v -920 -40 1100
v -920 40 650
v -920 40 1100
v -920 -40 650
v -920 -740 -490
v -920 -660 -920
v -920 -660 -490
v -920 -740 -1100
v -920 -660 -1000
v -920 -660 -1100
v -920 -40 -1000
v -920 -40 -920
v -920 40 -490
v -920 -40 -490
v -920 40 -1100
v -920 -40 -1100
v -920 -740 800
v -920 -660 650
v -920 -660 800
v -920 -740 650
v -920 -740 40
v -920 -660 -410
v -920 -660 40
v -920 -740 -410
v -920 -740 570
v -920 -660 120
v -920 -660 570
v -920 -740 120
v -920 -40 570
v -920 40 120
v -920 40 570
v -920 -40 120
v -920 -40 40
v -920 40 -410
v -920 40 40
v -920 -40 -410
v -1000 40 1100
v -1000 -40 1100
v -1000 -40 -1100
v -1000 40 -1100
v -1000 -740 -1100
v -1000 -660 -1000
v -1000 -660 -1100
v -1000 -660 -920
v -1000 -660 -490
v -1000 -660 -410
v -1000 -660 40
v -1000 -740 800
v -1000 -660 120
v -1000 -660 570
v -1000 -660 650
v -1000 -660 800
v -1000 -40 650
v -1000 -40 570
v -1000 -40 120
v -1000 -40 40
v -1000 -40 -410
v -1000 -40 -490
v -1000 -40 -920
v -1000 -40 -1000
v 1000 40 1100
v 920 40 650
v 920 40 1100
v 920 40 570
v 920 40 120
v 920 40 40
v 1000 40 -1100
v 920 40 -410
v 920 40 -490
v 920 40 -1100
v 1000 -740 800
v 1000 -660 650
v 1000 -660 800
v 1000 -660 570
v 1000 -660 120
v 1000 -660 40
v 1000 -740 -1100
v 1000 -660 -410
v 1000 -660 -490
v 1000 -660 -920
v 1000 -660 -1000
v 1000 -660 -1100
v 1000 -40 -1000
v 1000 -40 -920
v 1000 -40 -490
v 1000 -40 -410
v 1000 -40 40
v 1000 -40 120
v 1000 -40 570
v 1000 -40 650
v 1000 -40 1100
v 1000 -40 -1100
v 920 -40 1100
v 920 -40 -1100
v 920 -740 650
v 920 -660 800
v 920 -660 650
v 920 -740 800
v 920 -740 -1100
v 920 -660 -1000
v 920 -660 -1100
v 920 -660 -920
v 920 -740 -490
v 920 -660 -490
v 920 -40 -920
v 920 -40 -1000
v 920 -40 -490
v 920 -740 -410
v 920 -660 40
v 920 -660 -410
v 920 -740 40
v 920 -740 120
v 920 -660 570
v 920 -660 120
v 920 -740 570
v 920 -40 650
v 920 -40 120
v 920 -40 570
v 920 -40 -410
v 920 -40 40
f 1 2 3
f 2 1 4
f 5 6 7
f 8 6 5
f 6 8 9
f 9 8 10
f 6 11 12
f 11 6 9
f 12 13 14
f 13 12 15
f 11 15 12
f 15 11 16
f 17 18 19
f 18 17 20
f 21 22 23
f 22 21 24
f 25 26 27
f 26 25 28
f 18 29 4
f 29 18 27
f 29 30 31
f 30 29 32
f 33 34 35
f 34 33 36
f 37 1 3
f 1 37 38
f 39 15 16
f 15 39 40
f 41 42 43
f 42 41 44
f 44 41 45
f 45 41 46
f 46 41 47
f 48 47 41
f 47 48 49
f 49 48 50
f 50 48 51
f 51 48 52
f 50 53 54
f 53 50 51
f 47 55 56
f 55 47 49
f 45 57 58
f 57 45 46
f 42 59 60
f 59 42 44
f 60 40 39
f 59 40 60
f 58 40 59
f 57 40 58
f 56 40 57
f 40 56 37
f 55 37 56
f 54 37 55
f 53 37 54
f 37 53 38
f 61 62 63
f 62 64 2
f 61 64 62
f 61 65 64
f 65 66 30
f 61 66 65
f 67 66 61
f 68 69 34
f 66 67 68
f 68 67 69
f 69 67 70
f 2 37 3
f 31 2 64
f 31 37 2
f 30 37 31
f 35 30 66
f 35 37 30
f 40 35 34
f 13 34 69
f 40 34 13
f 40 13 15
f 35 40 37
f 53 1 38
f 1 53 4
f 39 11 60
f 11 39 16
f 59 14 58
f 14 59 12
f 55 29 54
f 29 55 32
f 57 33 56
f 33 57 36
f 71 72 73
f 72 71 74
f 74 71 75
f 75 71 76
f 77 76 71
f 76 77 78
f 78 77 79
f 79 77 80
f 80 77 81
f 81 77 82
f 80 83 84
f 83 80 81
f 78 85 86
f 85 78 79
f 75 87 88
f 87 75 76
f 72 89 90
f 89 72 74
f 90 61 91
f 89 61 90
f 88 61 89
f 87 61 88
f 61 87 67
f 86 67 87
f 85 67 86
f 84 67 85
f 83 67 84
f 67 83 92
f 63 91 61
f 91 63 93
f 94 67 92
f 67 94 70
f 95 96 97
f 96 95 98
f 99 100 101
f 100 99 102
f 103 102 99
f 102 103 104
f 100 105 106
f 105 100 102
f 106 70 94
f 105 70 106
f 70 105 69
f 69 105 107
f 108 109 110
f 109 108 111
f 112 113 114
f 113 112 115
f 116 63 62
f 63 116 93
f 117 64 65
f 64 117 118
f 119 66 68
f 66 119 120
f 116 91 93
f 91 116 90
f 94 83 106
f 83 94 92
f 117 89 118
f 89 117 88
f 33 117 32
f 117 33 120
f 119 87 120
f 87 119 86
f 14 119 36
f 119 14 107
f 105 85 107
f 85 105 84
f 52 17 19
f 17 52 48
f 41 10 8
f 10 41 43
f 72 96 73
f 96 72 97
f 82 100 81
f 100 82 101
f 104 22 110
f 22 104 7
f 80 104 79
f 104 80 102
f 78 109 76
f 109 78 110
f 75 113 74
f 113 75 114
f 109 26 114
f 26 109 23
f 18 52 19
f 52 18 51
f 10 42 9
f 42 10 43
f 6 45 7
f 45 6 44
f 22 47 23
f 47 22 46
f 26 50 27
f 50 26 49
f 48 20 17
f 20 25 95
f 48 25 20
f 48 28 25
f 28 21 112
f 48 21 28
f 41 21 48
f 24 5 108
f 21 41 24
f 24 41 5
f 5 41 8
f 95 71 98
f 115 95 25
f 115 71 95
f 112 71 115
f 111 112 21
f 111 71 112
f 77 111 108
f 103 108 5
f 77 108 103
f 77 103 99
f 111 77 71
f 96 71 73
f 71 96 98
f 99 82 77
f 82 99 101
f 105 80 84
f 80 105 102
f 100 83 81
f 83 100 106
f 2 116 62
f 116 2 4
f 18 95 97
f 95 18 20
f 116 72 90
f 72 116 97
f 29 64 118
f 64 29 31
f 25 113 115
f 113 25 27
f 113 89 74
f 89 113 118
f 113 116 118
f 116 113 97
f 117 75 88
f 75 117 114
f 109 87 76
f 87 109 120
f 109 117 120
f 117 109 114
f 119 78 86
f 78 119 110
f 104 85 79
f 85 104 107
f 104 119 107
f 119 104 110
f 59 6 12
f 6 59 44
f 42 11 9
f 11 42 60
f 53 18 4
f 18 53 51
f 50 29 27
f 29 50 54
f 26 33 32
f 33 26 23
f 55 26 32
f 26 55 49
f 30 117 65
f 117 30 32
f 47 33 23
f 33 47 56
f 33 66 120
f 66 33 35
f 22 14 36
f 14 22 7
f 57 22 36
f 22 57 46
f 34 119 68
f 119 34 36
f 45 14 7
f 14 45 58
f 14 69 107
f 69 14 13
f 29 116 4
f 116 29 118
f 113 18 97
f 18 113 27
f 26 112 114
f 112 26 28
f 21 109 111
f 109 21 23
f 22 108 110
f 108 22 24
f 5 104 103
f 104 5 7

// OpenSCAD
// file: ../library/modules.scad
module box(width, length, height, wallThickness, open = "top") {    
    // inner core in the center, equals to open == "none"
    innerHeight = open == "bottom" ? height+1 : (open == "top" ? height+1 : height);
    innerZ = open == "bottom" ? -wallThickness : (open == "top" ? wallThickness : 0);


    innerWidth = open == "left" ? width+1 : (open == "right" ? width+1 : width);
    innerX = open == "left" ? -wallThickness : (open == "right" ? wallThickness : 0);

    innerLength = open == "front" ? length+1 : (open == "back" ? length+1 : length);
    innerY = open == "front" ? -wallThickness : (open == "back" ? wallThickness : 0);


    translate([0, 0, height / 2 + wallThickness])
    difference() {
        cube(size = [length + 2 * wallThickness, width + 2 * wallThickness, height + 2 * wallThickness], center = true);
        translate([innerX, innerY, innerZ])
            cube(size = [innerLength, innerWidth, innerHeight], center = true);
    }
}
// main file
include <../library/modules.scad>


module regal(width, length, height, logThickness) {
    // überstand seitlich
    overhang = 250;
    // Höhenunterschied Dach
    heightDiff = 300;
    // Abstand von Unten bis zur untersten Querstrebe
    supportLowerSpace = 100;
    // Abstand von Oben/Vorne bis zur obersten Querstrebe
    supportUpperSpace = 150;
    // Höhe der Kajaks
    kajakHeight=450;


    // breite minus überstand seitlich geteilt durch zwei, wird Intern benötigt um die Pfosten zu positionieren
    moveLeg = (width - (2 * overhang) - logThickness) / 2;
    // Tablar Abstand
    shellIncrement = kajakHeight + logThickness;

    // pfosten hinten
    // links
    translate([-moveLeg, 0, 0])
        cube(size = [logThickness, logThickness, height], center = true);
    // rechts
    translate([moveLeg, 0, 0])
        cube(size = [logThickness, logThickness, height], center = true);

    // pfosten vorne
    // links
    translate([-moveLeg, -length, - heightDiff / 2])
        cube(size = [logThickness, logThickness, height - heightDiff], center = true);
    // rechts
    translate([moveLeg, -length, - heightDiff / 2])
        cube(size = [logThickness, logThickness, height - heightDiff], center = true);


    // querstreben
    // links unten
    translate([moveLeg, -length / 2, 0])
        translate([0, 0, - (height / 2) + (logThickness / 2) + supportLowerSpace])
            cube(size = [logThickness, length, logThickness], center = true);



    // links oben
    translate([moveLeg, -length / 2, 0])
        // oben
        translate([0, 0, (height / 2 - logThickness / 2) - heightDiff - supportUpperSpace])
            cube(size = [logThickness, length, logThickness], center = true);
    
    // links erstes Tablar
    translate([moveLeg, -length / 2, 0])
        // oben
        translate([0, 0, (height / 2 - logThickness / 2) - heightDiff - supportUpperSpace - shellIncrement])
            cube(size = [logThickness, length, logThickness], center = true);

    // links zweites Tablar
    translate([moveLeg, -length / 2, 0])
        // oben
        translate([0, 0, (height / 2 - logThickness / 2) - heightDiff - supportUpperSpace - (shellIncrement * 2)])
            cube(size = [logThickness, length, logThickness], center = true);







    // rechts unten
    translate([-moveLeg, -length / 2, 0])
        translate([0, 0, - (height / 2) + (logThickness / 2) + supportLowerSpace])
            cube(size = [logThickness, length, logThickness], center = true);
        
    // rechts oben
    translate([-moveLeg, -length / 2, 0])
        // oben
        translate([0, 0, (height / 2 - logThickness / 2) - heightDiff - supportUpperSpace])
            cube(size = [logThickness, length, logThickness], center = true);

    // rechts erstes Tablar
    translate([-moveLeg, -length / 2, 0])
        // oben
        translate([0, 0, (height / 2 - logThickness / 2) - heightDiff - supportUpperSpace - shellIncrement])
            cube(size = [logThickness, length, logThickness], center = true);

    // rechts zweites Tablar
    translate([-moveLeg, -length / 2, 0])
        // oben
        translate([0, 0, (height / 2 - logThickness / 2) - heightDiff - supportUpperSpace - (shellIncrement * 2)])
            cube(size = [logThickness, length, logThickness], center = true);



    // streben längs
    // hinten oben 
    translate([0, 0, (height / 2 - logThickness / 2) - heightDiff - supportUpperSpace])
        cube(size = [width - (overhang * 2), logThickness, logThickness], center = true);

    // hinten erstes Tablar
    translate([0, 0, (height / 2 - logThickness / 2) - heightDiff - supportUpperSpace - shellIncrement])
        cube(size = [width - (overhang * 2), logThickness, logThickness], center = true);

    // hinten zweites Tablar
    translate([0, 0, (height / 2 - logThickness / 2) - heightDiff - supportUpperSpace - (shellIncrement * 2)])
        cube(size = [width - (overhang * 2), logThickness, logThickness], center = true);


    // vorne oben 
    translate([0, - length, (height / 2 - logThickness / 2) - heightDiff - supportUpperSpace])
        cube(size = [width - (overhang * 2), logThickness, logThickness], center = true);

    // vorne erstes Tablar
    translate([0, - length, (height / 2 - logThickness / 2) - heightDiff - supportUpperSpace - shellIncrement])
        cube(size = [width - (overhang * 2), logThickness, logThickness], center = true);

    // vorne zweites Tablar
    translate([0, - length, (height / 2 - logThickness / 2) - heightDiff - supportUpperSpace - (shellIncrement * 2)])
        cube(size = [width - (overhang * 2), logThickness, logThickness], center = true);





    module partsList() {
        // Beine Hinten
        echo(str("Beine Hinten", " ", "2", " ", height, " ", logThickness, " ", logThickness));
        echo(str("Beine Vorne", " ", "2", " ", height - heightDiff, " ", logThickness, " ", logThickness));
        echo(str("Quer-Streben", " ", "8", " ", length, " ", logThickness, " ", logThickness));
        echo(str("Längs-Streben", " ", "6", " ", width - (overhang * 2), " ", logThickness, " ", logThickness));
    }

    partsList();



}


regal(2500, 700, 2200, 80);
